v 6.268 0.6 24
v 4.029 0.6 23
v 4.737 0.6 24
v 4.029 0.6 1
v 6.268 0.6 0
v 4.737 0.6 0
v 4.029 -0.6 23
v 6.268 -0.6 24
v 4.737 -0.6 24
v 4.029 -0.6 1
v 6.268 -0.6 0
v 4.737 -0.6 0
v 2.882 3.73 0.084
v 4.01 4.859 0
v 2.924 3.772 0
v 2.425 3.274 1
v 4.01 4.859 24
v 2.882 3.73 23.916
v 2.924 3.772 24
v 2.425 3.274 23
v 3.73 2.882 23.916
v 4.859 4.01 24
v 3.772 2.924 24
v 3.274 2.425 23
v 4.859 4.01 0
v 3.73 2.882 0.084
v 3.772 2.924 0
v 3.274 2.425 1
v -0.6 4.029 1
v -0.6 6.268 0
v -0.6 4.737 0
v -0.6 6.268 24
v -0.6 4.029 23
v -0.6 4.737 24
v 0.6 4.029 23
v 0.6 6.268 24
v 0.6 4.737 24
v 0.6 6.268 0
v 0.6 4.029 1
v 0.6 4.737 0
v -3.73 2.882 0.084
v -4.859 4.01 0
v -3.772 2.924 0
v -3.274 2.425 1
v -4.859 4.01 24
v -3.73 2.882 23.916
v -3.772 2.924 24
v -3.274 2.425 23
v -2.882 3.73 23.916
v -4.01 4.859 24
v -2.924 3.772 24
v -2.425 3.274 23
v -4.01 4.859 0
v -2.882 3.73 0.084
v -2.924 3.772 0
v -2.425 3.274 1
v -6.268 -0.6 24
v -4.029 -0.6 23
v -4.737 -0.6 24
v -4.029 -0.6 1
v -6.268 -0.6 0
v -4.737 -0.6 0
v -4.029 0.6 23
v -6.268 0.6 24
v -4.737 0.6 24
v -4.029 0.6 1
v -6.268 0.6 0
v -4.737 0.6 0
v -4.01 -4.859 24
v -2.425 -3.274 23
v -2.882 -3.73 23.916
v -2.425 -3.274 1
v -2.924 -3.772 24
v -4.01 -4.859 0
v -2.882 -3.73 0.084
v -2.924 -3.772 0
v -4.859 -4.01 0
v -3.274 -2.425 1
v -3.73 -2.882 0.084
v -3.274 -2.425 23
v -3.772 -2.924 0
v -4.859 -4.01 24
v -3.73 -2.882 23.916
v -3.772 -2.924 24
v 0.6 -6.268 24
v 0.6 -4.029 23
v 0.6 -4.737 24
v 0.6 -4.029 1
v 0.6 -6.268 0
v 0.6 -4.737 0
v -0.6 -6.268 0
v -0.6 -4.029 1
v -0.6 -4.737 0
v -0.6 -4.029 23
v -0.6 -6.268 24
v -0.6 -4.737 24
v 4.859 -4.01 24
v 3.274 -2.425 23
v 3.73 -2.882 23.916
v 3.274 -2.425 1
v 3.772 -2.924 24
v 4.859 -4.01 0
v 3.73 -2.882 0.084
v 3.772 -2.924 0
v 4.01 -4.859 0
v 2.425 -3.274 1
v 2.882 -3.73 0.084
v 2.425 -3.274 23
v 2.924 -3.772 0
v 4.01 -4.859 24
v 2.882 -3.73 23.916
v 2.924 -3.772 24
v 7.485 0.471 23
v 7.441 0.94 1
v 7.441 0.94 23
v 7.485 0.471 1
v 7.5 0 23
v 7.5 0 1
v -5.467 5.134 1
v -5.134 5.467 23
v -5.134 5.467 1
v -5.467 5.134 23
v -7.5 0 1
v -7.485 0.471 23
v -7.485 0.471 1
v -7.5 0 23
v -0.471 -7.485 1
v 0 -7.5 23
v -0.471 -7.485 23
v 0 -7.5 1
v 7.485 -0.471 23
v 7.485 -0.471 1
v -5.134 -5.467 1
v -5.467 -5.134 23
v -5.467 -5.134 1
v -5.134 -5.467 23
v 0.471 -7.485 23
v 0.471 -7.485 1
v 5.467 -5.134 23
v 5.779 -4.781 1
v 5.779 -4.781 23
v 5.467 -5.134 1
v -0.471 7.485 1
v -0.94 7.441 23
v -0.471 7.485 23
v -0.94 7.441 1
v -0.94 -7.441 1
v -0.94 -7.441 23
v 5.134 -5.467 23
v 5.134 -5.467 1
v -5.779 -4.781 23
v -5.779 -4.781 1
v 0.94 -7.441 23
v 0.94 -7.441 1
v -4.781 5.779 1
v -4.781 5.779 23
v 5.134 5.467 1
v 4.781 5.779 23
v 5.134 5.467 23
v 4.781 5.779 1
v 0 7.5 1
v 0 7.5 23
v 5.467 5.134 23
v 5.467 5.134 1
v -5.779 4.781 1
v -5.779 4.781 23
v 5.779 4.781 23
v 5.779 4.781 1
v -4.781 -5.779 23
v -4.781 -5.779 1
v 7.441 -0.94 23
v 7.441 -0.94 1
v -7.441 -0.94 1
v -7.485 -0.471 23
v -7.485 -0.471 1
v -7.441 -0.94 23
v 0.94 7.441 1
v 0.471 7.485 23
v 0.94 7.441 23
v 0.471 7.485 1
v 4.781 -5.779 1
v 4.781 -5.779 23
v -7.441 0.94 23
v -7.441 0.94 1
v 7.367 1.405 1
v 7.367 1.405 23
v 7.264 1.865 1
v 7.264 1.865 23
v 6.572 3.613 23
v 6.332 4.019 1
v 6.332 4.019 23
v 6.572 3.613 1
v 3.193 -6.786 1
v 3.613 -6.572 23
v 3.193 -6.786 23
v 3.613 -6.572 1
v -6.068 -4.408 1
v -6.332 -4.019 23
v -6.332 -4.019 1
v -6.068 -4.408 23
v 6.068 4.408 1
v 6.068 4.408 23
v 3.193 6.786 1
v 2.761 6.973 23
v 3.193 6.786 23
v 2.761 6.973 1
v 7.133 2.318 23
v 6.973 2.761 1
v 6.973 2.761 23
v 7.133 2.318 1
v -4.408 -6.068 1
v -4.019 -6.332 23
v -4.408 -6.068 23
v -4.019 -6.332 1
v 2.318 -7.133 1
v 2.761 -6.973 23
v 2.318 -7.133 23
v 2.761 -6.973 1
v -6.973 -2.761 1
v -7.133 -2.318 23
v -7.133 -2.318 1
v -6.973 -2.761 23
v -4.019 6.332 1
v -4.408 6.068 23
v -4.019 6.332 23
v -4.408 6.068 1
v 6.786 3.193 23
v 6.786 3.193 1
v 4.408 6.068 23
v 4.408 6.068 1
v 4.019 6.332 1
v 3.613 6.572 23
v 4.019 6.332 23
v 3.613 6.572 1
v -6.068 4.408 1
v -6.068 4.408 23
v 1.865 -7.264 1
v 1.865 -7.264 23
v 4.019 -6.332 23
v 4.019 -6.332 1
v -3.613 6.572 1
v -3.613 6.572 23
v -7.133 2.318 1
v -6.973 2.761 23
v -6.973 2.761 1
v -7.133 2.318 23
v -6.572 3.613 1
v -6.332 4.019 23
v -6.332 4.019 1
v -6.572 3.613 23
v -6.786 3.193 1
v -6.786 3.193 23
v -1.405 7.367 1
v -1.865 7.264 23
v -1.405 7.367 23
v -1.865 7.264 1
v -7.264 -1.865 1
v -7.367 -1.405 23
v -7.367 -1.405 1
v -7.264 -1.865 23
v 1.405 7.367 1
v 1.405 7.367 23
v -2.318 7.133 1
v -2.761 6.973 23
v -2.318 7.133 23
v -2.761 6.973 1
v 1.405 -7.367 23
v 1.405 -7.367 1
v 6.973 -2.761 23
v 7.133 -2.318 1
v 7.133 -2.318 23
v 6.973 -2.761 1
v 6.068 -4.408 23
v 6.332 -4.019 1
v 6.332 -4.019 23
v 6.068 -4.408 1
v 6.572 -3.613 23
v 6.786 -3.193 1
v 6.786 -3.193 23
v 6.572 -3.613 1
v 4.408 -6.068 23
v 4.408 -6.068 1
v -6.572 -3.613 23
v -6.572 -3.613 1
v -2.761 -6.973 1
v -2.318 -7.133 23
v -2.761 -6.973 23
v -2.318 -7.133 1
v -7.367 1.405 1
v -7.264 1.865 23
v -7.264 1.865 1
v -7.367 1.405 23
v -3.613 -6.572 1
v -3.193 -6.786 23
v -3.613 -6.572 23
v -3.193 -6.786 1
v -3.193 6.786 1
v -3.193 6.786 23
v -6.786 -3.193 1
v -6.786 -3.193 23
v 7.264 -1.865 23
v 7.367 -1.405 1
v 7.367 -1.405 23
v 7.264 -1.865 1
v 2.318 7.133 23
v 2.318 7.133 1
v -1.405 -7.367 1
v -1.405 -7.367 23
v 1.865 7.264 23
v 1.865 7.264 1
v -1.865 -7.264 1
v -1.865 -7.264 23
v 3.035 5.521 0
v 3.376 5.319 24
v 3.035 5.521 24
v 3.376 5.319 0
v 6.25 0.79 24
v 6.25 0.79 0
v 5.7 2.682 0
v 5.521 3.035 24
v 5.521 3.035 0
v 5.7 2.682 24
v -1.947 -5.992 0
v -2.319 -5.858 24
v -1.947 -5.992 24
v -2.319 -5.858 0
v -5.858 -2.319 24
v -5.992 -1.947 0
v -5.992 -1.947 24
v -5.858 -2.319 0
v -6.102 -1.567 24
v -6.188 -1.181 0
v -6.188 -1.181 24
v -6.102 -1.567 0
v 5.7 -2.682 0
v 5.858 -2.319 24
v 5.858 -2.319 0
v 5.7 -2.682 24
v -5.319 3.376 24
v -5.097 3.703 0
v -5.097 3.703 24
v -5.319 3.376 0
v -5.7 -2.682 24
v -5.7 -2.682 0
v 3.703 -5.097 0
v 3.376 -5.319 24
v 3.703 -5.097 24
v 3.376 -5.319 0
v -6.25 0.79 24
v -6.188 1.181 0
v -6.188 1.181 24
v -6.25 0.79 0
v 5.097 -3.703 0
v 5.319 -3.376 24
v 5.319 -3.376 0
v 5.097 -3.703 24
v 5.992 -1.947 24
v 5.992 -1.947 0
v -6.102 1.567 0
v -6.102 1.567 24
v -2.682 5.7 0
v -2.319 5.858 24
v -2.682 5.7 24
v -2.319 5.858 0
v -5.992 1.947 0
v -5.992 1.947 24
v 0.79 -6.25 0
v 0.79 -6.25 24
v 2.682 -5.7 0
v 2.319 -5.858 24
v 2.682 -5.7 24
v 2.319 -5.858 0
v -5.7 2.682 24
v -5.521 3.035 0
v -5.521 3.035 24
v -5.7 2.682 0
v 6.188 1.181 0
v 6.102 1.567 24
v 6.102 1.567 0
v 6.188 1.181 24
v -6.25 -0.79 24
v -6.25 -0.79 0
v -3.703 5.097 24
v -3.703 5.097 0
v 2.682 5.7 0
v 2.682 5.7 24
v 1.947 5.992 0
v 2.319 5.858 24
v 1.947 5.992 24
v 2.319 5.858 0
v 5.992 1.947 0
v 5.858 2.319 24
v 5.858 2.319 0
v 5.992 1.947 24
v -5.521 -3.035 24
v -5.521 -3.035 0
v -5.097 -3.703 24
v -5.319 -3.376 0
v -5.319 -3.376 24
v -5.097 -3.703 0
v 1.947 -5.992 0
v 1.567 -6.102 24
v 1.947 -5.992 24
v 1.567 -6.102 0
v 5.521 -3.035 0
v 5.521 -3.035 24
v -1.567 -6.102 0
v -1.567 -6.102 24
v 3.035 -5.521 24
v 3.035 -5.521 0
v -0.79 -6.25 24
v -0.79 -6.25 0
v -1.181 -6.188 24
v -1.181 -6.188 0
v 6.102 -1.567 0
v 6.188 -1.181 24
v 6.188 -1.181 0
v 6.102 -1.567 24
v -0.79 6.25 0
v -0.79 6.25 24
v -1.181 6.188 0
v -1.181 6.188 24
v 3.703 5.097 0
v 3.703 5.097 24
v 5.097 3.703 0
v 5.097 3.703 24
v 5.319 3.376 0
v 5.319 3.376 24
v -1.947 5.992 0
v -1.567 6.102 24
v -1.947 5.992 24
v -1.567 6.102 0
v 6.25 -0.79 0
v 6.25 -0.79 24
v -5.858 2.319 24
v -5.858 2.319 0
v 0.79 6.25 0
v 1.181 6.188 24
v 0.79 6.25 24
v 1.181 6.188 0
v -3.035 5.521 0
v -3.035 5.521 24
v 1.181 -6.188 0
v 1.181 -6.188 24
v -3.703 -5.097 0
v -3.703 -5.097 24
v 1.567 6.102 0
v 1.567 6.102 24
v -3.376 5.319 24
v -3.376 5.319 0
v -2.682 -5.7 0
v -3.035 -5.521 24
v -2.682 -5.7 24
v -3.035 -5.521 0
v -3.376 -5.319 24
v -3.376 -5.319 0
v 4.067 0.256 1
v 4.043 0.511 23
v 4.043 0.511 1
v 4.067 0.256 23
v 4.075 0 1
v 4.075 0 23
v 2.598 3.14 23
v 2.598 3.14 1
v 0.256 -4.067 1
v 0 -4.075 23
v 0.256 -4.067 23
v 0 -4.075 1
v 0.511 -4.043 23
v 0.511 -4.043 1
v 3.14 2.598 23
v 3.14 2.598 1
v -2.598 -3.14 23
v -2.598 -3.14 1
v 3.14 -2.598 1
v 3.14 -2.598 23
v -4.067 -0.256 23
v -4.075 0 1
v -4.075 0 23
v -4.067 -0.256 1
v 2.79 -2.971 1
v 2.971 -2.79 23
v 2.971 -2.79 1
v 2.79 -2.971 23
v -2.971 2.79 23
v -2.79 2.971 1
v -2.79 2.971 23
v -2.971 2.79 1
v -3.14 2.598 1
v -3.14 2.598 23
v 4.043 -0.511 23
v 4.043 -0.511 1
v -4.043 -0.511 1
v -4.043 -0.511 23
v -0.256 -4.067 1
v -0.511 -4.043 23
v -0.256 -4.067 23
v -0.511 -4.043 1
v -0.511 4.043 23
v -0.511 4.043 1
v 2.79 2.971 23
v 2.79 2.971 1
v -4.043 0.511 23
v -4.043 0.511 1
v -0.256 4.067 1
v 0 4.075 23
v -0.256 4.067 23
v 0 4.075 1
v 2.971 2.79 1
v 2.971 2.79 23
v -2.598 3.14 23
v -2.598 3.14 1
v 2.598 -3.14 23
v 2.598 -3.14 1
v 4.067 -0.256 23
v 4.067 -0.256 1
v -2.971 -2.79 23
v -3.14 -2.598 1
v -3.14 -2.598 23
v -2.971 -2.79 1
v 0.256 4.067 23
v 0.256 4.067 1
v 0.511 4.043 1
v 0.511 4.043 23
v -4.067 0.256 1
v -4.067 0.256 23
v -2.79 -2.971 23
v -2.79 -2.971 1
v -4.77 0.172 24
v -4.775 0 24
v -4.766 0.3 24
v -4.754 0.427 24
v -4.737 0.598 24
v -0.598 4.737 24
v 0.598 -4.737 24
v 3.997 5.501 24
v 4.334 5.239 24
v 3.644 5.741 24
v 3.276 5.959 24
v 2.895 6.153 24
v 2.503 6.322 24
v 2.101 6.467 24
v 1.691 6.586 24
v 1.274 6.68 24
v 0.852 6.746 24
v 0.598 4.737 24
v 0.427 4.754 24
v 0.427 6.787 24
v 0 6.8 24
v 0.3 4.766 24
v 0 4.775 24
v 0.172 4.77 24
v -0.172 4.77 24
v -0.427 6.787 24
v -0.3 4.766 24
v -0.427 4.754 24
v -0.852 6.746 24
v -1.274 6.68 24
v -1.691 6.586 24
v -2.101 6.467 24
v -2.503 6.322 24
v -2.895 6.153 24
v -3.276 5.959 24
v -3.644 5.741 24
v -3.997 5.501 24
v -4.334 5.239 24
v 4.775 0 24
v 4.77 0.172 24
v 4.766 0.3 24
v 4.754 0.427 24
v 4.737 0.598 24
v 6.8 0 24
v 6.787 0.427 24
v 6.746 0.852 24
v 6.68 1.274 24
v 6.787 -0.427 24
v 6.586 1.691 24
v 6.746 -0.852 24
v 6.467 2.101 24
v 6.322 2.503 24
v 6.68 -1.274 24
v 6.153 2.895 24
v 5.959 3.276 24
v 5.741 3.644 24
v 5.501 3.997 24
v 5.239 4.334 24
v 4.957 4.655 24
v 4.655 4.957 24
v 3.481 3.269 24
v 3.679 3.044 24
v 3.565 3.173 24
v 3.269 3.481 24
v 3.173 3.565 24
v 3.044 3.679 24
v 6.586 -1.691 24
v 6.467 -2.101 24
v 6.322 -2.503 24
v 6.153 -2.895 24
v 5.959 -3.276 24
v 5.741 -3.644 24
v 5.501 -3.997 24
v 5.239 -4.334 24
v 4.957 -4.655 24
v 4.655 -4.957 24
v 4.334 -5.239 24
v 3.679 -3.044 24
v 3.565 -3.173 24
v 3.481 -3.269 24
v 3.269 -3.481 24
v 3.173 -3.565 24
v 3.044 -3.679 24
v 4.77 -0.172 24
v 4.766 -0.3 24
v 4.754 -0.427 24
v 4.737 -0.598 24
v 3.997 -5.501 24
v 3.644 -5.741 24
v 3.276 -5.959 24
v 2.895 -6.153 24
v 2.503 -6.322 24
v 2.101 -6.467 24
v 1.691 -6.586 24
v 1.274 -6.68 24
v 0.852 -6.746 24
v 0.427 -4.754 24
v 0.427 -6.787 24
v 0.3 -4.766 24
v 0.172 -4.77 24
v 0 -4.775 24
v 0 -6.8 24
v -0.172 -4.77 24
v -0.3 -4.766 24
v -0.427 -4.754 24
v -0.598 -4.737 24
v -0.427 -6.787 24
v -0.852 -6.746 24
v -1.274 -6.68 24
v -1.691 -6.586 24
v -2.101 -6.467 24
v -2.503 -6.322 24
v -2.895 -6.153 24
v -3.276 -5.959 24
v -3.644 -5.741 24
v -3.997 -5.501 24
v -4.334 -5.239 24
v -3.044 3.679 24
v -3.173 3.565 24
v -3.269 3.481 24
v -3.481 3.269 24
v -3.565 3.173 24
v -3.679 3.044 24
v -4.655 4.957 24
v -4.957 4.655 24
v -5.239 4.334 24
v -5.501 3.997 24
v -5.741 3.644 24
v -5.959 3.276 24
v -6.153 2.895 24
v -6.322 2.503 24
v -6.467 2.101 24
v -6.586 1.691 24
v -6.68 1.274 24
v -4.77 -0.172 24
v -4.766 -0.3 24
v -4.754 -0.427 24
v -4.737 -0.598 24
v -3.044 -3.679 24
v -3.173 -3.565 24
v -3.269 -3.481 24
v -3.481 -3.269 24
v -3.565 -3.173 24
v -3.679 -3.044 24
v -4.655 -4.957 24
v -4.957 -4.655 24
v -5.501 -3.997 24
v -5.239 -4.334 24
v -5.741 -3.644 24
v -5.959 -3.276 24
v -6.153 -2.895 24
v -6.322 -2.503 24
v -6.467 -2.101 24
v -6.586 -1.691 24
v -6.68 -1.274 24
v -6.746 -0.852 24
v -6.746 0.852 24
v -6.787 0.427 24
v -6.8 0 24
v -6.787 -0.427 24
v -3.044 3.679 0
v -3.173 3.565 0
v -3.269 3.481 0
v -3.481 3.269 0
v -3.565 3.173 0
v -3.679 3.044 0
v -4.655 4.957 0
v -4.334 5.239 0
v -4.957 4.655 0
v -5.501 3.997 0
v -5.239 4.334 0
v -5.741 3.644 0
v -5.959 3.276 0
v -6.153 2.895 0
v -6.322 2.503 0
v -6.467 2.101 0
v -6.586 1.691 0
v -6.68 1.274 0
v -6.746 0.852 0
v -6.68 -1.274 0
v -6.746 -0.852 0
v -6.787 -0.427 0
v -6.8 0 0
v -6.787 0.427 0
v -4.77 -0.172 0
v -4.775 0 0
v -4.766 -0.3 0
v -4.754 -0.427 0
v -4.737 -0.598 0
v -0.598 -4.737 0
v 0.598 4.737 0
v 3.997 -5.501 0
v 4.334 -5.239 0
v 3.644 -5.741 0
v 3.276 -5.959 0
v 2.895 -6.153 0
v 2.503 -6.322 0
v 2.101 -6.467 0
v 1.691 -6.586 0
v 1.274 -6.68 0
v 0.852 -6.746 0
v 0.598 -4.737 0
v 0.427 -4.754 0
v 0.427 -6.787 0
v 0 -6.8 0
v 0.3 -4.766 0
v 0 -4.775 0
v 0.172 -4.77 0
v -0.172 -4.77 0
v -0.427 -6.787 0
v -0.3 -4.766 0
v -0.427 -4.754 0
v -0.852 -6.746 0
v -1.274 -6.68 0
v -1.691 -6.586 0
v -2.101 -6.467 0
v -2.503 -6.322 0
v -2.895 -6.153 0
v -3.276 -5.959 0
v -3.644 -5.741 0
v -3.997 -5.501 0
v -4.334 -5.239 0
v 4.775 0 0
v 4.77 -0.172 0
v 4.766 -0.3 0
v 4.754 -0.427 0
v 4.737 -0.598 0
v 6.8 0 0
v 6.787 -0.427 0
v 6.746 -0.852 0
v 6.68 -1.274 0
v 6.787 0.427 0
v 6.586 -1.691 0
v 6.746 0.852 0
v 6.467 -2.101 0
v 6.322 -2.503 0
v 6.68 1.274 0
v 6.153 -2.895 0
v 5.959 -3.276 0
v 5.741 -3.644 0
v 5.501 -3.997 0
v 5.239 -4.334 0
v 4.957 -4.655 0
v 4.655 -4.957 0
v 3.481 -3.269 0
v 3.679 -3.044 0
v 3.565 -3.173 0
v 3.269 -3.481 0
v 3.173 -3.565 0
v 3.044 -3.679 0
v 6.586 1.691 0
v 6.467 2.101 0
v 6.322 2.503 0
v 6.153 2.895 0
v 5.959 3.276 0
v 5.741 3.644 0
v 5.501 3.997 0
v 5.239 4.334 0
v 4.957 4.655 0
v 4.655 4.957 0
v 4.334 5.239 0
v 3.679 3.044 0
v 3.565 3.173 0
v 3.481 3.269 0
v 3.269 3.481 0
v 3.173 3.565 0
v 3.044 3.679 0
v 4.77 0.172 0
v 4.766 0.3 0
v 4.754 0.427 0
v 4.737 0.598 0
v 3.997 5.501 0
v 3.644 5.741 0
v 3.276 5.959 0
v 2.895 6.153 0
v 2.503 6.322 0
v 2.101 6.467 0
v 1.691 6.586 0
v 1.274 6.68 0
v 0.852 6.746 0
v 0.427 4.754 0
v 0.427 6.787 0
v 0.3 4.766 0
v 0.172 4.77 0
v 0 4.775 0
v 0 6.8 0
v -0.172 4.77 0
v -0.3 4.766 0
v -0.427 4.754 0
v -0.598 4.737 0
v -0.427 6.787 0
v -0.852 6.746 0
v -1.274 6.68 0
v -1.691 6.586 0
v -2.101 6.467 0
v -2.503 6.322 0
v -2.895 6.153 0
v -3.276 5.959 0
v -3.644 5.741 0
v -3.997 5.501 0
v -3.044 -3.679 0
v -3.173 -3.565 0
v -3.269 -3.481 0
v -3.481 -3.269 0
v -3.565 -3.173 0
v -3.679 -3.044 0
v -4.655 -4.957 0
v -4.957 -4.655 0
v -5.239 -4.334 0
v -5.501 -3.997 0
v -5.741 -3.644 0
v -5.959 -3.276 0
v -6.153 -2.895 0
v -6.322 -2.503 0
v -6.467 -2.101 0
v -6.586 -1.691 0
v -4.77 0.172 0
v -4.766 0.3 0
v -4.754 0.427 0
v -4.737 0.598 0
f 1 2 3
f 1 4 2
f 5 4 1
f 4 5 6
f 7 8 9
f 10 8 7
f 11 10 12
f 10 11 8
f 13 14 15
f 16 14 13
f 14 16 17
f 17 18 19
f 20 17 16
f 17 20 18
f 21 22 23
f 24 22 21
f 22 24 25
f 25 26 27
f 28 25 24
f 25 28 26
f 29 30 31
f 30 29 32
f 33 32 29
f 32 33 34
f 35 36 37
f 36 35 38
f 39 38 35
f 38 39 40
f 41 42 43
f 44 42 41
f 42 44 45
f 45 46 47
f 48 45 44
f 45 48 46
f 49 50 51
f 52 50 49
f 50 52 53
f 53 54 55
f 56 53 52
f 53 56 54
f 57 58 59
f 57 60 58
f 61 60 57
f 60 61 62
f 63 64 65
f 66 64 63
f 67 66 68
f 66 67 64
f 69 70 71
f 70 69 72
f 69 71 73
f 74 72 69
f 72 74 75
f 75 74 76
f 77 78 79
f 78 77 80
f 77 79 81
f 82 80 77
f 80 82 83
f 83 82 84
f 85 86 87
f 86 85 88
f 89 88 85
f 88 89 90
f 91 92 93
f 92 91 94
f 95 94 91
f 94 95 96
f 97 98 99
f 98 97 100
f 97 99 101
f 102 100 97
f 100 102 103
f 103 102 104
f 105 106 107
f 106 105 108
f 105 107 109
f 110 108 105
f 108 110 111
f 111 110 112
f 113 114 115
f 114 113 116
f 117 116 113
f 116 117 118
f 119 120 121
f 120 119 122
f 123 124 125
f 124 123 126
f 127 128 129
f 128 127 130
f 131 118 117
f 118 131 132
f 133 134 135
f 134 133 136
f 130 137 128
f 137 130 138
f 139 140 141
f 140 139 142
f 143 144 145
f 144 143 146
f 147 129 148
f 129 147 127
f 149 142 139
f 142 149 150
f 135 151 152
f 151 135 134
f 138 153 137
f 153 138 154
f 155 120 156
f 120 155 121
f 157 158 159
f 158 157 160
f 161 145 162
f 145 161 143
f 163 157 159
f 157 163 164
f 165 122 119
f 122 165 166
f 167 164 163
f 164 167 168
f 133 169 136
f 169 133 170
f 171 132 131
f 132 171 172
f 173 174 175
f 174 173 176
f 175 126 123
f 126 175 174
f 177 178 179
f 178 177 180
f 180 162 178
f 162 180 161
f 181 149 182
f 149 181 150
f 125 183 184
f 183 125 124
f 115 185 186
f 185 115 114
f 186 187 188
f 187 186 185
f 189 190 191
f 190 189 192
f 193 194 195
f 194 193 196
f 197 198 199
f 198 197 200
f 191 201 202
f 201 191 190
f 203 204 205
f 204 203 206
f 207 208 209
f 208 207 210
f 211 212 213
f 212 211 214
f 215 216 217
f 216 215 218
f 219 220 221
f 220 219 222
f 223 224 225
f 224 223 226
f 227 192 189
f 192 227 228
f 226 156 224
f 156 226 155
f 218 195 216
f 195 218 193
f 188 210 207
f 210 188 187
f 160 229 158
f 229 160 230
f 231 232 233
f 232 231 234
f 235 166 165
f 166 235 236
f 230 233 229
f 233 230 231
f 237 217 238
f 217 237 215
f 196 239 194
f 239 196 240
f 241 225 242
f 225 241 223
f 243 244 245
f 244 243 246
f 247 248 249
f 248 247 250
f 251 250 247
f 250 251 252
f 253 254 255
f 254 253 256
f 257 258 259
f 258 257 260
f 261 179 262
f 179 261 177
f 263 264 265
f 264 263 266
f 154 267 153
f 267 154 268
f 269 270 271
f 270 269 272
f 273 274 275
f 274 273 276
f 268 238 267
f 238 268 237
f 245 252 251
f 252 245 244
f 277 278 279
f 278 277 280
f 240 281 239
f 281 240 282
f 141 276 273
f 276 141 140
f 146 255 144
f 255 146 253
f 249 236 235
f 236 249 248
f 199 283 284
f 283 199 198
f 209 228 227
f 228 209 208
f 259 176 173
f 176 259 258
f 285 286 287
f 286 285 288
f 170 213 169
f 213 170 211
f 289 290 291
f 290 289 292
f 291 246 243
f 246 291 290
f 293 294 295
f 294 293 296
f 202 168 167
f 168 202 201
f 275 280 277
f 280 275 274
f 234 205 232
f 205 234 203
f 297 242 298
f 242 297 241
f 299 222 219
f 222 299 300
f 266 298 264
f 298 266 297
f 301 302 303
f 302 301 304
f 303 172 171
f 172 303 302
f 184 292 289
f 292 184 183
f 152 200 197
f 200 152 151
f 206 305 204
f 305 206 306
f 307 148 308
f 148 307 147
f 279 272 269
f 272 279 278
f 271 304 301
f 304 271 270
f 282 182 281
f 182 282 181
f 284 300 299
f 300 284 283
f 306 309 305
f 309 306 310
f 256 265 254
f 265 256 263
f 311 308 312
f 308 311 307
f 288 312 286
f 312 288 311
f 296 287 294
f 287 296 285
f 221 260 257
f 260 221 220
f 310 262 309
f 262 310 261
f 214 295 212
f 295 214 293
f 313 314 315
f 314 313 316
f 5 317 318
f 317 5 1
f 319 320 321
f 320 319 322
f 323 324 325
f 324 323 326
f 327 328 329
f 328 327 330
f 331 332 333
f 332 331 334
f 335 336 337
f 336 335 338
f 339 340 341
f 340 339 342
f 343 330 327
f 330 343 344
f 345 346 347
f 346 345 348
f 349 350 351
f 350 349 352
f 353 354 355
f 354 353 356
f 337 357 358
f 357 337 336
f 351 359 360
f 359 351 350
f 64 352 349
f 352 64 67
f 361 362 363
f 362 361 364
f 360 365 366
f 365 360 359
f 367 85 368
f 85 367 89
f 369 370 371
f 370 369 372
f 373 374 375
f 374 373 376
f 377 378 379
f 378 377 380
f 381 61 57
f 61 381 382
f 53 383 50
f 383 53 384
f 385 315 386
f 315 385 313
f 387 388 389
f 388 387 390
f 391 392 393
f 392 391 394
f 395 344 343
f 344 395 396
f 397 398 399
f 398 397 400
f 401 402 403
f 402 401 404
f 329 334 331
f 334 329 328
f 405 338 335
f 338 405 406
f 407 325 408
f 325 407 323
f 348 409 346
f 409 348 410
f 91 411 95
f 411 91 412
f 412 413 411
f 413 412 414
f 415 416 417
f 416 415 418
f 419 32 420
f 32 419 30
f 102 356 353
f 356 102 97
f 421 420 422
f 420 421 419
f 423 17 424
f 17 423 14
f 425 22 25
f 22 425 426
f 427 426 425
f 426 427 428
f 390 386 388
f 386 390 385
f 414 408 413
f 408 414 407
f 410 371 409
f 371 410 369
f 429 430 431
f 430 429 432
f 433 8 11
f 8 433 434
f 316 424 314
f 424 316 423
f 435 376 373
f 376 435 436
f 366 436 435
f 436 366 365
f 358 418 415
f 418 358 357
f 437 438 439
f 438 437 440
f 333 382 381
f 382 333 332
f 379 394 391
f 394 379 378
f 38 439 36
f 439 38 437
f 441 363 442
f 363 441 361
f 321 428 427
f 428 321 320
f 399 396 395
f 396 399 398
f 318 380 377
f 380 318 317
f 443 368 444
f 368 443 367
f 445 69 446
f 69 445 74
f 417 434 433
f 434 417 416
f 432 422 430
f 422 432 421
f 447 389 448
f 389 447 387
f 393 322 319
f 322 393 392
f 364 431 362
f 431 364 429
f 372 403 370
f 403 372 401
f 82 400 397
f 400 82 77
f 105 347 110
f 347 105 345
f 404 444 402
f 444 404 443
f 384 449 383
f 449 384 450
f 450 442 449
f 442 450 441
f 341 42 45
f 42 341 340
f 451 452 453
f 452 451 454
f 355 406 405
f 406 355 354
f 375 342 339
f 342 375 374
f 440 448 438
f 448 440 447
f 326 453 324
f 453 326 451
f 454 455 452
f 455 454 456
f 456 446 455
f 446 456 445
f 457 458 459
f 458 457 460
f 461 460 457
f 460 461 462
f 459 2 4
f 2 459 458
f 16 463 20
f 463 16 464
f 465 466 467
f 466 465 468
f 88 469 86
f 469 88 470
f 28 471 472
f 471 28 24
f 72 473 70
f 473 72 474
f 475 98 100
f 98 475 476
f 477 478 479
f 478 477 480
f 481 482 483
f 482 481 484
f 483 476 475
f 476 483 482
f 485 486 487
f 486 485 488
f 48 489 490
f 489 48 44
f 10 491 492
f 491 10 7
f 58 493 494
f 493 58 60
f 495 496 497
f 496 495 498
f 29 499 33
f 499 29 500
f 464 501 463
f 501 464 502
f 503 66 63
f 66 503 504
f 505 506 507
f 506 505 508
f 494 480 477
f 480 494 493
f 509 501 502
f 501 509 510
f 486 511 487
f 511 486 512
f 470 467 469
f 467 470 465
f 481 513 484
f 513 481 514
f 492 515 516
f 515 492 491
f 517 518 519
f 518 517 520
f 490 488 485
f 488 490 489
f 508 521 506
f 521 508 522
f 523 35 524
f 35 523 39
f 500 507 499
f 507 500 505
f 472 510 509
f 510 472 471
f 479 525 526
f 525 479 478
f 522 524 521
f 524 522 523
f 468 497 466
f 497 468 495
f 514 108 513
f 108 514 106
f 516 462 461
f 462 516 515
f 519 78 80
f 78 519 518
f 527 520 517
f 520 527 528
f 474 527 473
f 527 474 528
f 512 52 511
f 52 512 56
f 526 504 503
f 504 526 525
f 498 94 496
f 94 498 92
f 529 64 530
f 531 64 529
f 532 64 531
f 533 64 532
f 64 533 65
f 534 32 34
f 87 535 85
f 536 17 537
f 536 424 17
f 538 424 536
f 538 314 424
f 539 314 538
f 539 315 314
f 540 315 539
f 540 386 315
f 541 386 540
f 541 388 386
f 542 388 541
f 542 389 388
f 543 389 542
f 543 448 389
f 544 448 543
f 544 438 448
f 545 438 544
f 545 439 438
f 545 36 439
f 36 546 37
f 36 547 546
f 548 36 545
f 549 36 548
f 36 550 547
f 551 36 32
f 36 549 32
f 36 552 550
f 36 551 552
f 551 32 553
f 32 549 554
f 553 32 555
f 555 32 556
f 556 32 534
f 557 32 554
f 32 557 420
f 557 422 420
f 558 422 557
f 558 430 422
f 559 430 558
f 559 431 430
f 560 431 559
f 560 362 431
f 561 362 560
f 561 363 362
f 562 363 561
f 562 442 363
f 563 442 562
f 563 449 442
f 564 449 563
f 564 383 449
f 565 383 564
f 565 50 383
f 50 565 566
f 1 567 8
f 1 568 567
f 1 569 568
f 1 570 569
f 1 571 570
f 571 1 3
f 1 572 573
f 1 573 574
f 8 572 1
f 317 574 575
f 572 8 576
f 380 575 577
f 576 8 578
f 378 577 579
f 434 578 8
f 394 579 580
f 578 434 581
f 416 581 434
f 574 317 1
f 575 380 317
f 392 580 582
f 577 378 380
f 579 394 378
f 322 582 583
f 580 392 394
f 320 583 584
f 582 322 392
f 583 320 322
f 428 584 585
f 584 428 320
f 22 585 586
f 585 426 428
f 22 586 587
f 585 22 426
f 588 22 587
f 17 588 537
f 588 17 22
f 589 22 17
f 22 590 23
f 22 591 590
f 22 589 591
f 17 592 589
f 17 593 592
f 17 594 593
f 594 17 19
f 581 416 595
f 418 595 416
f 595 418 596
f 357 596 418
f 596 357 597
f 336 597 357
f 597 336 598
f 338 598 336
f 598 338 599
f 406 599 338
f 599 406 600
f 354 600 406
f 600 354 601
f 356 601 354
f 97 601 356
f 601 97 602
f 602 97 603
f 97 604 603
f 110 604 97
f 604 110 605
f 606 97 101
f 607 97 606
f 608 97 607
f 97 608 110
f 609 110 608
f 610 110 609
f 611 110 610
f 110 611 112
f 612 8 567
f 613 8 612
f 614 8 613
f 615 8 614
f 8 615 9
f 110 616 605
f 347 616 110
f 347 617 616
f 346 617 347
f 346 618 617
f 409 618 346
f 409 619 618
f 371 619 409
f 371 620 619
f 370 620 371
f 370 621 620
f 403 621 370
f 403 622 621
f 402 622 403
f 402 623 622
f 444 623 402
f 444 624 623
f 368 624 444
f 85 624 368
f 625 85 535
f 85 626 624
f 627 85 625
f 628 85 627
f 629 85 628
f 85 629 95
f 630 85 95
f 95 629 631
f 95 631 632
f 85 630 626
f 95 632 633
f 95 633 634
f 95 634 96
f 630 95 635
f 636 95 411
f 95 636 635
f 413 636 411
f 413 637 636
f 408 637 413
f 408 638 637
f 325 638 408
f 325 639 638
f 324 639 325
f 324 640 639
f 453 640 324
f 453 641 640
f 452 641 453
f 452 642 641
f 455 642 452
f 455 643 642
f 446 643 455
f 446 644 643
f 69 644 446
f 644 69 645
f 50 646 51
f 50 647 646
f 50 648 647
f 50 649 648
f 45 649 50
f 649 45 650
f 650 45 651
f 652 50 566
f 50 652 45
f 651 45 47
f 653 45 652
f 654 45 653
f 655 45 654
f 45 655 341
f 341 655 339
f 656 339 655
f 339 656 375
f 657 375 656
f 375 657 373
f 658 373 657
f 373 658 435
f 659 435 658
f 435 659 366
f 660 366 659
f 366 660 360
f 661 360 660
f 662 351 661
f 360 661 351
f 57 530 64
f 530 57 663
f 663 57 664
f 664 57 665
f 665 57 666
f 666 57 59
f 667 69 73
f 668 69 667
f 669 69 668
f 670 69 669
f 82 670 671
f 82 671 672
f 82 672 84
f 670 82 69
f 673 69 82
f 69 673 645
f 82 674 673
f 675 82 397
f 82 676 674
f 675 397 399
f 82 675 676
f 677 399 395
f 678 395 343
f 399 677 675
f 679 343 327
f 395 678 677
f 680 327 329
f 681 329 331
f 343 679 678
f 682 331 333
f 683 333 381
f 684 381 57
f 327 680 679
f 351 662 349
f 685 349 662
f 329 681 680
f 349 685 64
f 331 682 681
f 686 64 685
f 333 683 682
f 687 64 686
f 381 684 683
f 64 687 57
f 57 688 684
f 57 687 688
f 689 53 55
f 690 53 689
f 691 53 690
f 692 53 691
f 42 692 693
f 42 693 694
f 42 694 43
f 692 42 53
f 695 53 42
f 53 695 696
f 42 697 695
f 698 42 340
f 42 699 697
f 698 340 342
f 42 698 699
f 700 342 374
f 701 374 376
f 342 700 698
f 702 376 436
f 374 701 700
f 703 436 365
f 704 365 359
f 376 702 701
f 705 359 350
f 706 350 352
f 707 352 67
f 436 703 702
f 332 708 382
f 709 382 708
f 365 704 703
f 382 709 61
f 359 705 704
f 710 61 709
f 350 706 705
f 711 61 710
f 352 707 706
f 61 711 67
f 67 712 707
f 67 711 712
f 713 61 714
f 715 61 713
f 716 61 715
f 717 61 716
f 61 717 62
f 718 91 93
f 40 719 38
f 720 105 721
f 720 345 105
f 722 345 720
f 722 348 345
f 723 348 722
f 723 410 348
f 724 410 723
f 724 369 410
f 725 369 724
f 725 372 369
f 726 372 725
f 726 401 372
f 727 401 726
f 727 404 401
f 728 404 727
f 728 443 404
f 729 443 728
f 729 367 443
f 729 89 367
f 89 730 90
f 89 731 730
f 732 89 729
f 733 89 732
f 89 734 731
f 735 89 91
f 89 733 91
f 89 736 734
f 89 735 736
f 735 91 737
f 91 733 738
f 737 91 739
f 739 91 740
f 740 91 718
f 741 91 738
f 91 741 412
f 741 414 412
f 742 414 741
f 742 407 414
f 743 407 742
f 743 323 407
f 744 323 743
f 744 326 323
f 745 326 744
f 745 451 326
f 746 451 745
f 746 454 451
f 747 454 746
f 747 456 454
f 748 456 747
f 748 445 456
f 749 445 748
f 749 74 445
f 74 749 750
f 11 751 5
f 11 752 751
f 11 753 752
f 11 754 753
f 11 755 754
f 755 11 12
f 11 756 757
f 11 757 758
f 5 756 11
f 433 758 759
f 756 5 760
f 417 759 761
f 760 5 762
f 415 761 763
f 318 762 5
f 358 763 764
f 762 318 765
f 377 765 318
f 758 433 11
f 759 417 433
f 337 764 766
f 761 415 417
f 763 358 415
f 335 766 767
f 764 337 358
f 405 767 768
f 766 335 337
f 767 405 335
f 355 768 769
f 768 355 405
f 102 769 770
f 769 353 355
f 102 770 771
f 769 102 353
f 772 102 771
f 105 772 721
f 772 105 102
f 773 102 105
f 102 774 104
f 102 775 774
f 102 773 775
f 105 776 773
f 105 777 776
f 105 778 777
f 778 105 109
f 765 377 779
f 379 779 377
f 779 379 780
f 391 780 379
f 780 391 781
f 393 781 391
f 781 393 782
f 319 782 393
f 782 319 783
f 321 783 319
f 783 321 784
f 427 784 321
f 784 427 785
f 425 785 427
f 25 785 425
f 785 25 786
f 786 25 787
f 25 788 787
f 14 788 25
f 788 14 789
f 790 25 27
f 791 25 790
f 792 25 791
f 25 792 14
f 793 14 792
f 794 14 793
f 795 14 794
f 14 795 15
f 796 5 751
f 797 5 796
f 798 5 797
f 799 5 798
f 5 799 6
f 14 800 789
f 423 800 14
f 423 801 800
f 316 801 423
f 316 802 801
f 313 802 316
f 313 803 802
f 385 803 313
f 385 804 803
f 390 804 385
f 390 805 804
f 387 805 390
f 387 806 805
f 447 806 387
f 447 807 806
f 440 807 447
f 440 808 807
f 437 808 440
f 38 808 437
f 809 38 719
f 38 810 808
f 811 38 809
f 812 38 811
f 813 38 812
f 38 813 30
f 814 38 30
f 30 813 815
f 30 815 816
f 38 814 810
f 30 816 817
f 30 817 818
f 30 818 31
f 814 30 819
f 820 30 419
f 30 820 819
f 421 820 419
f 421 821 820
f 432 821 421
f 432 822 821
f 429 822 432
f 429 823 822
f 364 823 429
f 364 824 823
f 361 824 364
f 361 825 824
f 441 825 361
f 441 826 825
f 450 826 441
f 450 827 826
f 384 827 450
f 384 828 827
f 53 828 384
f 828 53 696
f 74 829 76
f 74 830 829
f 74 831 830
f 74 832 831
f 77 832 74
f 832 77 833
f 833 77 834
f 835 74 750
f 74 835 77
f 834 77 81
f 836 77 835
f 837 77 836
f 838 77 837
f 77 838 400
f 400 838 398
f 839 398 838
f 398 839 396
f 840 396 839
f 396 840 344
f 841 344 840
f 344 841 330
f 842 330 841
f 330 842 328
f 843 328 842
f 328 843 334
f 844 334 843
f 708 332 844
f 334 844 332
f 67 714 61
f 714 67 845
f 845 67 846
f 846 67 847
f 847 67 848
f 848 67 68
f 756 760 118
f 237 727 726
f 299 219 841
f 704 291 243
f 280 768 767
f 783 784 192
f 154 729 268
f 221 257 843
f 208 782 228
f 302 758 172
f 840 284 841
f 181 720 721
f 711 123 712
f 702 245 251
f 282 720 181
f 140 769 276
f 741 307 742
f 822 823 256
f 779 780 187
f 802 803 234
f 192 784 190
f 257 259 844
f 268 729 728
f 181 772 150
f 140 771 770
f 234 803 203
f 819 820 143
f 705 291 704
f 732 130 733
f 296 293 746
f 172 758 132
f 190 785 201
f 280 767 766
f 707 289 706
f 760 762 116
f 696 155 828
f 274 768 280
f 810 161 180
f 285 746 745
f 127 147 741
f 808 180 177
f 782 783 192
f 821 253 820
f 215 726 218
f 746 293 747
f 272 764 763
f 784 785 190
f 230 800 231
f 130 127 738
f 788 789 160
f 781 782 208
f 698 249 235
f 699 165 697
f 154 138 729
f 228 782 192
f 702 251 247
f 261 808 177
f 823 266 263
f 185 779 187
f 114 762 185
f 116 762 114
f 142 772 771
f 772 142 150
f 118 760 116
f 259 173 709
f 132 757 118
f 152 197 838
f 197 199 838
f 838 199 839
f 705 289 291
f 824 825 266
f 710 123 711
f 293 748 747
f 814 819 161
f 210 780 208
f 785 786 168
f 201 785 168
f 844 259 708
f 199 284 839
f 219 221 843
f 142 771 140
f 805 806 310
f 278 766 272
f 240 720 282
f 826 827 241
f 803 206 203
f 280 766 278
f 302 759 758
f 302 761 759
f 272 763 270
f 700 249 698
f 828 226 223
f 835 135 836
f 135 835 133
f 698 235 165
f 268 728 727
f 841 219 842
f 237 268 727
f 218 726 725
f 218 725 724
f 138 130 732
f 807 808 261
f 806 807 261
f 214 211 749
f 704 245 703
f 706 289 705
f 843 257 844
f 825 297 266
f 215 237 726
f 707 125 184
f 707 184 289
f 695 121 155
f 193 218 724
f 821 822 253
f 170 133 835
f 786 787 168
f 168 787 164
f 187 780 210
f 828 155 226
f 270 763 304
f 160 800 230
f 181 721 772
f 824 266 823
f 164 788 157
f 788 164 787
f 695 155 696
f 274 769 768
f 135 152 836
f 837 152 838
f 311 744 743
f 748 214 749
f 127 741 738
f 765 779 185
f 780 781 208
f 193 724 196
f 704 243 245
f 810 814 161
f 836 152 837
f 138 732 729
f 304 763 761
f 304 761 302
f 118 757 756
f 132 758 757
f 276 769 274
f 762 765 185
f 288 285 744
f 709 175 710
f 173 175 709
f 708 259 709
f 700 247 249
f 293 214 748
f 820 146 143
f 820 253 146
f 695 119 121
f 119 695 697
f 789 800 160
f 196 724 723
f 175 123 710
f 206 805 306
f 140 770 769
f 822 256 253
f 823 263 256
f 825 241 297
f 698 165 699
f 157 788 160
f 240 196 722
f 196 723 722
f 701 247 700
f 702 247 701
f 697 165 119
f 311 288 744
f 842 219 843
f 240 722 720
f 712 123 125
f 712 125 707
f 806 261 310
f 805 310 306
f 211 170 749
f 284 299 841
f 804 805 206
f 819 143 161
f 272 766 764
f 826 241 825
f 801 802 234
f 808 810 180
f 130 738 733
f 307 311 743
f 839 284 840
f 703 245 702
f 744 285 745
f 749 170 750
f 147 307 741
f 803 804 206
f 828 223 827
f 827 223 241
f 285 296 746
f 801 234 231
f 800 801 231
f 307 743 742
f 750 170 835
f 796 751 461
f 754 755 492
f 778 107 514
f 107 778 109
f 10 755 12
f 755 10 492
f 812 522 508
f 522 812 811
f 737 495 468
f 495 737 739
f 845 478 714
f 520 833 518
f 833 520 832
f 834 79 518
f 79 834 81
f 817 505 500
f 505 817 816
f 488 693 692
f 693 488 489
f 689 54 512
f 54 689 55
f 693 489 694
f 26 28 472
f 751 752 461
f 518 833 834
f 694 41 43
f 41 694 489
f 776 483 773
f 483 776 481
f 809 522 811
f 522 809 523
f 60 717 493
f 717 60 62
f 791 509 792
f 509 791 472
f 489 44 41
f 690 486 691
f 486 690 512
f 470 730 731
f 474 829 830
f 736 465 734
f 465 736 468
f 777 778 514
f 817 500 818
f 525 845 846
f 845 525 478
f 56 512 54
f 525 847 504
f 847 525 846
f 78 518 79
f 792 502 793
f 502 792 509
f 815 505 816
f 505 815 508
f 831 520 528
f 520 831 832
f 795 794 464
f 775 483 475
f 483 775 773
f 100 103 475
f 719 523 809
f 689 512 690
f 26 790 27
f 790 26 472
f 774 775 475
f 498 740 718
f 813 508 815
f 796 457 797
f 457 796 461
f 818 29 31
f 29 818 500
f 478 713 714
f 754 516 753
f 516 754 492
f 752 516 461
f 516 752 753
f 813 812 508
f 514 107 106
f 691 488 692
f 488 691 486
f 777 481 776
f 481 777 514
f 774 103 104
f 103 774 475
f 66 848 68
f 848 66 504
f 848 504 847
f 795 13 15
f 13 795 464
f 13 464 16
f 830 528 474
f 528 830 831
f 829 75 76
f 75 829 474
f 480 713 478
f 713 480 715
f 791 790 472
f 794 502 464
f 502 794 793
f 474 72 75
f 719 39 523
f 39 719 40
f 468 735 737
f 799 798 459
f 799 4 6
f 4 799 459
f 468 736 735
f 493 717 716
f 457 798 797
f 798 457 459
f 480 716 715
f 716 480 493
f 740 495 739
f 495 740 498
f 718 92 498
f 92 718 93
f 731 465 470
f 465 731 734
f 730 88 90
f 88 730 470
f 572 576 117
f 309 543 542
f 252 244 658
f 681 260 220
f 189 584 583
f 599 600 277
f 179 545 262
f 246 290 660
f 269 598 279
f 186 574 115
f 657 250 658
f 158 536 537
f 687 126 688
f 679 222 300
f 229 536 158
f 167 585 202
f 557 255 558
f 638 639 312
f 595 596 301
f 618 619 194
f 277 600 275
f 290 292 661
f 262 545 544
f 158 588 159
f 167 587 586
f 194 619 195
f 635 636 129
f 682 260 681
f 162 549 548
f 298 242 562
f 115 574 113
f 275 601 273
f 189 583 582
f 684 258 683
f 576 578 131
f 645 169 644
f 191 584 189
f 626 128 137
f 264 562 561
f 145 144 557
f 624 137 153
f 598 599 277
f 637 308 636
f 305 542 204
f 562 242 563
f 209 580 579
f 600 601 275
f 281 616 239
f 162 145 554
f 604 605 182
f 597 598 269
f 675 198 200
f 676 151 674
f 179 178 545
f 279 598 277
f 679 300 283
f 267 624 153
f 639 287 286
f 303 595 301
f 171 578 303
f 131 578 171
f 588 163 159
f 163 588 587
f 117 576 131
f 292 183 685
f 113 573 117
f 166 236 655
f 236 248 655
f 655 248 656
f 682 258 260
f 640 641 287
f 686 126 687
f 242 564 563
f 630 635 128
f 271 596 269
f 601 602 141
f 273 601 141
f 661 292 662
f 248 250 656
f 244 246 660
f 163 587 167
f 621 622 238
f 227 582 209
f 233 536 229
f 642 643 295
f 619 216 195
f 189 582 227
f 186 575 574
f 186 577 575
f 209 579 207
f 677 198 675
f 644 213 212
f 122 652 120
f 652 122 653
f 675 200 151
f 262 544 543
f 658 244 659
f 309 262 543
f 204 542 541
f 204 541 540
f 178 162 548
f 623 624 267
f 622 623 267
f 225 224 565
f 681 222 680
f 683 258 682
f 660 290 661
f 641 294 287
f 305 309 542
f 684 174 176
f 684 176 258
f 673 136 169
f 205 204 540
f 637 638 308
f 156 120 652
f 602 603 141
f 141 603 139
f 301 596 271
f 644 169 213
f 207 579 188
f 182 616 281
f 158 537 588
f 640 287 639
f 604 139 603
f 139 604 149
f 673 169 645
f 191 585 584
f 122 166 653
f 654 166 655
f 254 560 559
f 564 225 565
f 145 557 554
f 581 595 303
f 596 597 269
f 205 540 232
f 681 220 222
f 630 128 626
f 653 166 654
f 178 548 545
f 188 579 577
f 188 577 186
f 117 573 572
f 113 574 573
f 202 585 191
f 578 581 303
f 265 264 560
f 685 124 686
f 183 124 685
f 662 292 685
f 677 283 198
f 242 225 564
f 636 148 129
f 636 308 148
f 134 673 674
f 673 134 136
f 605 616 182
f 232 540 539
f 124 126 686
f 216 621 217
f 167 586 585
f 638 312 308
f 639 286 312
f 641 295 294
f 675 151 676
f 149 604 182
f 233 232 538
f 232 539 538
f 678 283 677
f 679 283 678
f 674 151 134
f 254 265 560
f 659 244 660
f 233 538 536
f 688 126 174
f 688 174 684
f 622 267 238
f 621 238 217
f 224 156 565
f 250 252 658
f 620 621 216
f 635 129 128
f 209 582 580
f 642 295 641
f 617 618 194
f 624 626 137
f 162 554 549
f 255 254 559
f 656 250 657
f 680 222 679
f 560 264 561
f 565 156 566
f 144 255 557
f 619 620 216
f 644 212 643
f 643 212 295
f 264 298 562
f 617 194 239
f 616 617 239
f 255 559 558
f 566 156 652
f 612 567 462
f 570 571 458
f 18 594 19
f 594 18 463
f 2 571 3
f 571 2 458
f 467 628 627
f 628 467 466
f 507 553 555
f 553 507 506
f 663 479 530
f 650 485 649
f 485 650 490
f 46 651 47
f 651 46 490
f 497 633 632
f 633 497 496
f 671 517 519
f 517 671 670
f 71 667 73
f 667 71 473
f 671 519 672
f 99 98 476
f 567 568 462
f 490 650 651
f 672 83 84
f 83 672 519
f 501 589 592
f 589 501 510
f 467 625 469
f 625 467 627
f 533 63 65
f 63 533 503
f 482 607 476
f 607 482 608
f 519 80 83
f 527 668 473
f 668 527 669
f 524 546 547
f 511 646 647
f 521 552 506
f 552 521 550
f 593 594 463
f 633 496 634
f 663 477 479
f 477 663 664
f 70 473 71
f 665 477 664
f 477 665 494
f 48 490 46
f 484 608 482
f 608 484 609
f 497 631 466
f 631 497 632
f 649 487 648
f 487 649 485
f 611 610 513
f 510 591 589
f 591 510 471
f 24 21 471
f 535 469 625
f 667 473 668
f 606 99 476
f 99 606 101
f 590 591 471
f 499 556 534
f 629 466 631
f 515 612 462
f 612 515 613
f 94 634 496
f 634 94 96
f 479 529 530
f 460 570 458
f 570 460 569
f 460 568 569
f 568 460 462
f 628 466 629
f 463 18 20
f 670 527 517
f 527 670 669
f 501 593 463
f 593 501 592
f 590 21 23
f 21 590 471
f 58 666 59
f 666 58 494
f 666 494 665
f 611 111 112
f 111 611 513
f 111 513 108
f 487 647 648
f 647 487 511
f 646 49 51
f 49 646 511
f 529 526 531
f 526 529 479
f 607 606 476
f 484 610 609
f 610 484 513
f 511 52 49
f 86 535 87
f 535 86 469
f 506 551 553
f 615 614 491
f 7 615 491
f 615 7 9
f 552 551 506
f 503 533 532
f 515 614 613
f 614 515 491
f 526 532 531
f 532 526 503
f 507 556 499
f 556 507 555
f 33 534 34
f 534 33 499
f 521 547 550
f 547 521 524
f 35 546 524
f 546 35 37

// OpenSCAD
 /*
 * Customizable Linear Bushing - https://www.thingiverse.com/thing:2202854
 * by Dennis Hofmann - https://www.thingiverse.com/mightynozzle/about
 * created 2017-03-25
 * updated 2018-02-15
 * version v1.8
 *
 * Changelog
 * --------------
 * v1.8:
 *      - groove option added
 * v1.7:
 *      - fixed inner diameter
 * v1.6:
 *      - added chamfer angle option
 * v1.5:
 *      - fixed graphic glitch
 * v1.4:
 *      - added chamfer option
 *
 * v1.1-1.3:
 *      - initial model with minor changes in description
 *
 * --------------
 * 
 * This work is licensed under the Creative Commons - Attribution - Non-Commercial license.
 * https://creativecommons.org/licenses/by-nc/3.0/
 */
 
 // Parameter Section //
//-------------------//

/* [Bushing Settings] */

// Equals dr in technical diagrams. Use the outer diameter of the rod + tolerance value of your printer. Do some test prints before print a whole set of bushings. Best way in my case is to choose the bushing where can push it in with some effort on the rod and slide it by hand without any tools. Then slide it back and forth along the rod, until the bushing has the expected behavior. I suggest you not to use any drill or heat. The sliding of the bushing generates enough heat from its friction against the rod. Standard values: 6.00 for LM6(L)UU, 8.00 (default 8.15) for LM8(L)UU, 10.00 for LM10(L)UU, 12.00 for LM12(L)UU, 16.00 for LM16UU, ...
inner_diameter_in_millimeter = 8.15;

// Equals D in technical diagrams. Use the inner diameter of housing where the bushing sits + tolerance value of your printer. Depends on the filament you use and the total wall thickness of the bushings, the bushing shouldn't fit to tight in the housing. Standard values: 12.0 for LM6(L)UU, 15.0 (default) for LM8(L)UU, 19.0 for LM10(L)UU, 21.0 for LM12(L)UU, 28.0 for LM16UU, ...
outer_diameter_in_millimeter = 15; 

// Equals L in technical diagrams. Standard values: 19.0 for LM6UU, 24.0 for LM8UU, 29.0 for LM10UU, 30.0 for LM12UU, 35.0 for LM6LUU, 37.0 for LM16UU, 45.0 for LM8LUU, 55.0 for LM10LUU, 57.0 for LM12LUU, ...
bushing_length_in_millimeter = 24.0;

// Use a value to get straight primeters without any zigzag between the outer and inner perimeter. I use the value of 0.48 for 0.4 nozzle. This is the auto extrusion width of 0.48 of simplify3d. More information about this in the description of this design on thingiverse.
extrusion_width_in_millimeter = 0.3; 

// Use even numbers. E.g. 4 for LM8(L)UU. Don't forget to set the perimeter number in your Slicer! 
number_of_perimeters = 4; //[2:2:10]

// Choose a number to provide a gap between the teeth in the bushing. E.g. 8 or 10 for LM8(L)UU. The tooth width depends on the extrusion_width_in_millimeter and the number_of_perimeters.
number_of_teeth = 8; //[3:20]

// Radius of the chamfer. Set a chamfer if you want to insert the rod easier. This also helps if your prints tends to create elephant foot in the first few layers. A value between 0.3 and 1.0 might be a good value. Set a value above 0 might destroy the preview of the bushing. But the resulting stl-File will be correct.
chamfer_radius_in_millimeter = 0.7;

// Set the angle of the chamfer. 
chamfer_angle_in_degree = 55.0; // [30:75]

// Equals W in technical diagram. 1.1 for LM6/8(L)UU, 1.3 for LM10/12/13(L)UU, 1.6 for LM16/20(L)UU, 1.85 for LM25/30(L)UU, 2.1 for LM35/40(L)UU, 2.6 for LM50(L)UU, 3.15 for LM60(L)UU
groove_length_in_millimeter = 0;

// Equals D1 in technical diagram. 11.5 for LM6(L)UU, 14.3 for LM8(L)UU, 18.0 for LM10(L)UU, 20.0 for LM12(L)UU, 22.0 for LM13(L)UU, 27.0 for LM16(L)UU, 30.5 for LM20(L)UU, 38.0 for LM25(L)UU, 43.0 for LM30(L)UU, 49.0 for LM35(L)UU, 57.0 for LM40(L)UU, 76.5 for LM50(L)UU, 86.5 for LM60(L)UU
groove_diameter_in_millimeter = 0;

// Equals B in technical diagram. Outer distance between both grooves. 13.5 for LM6UU, 17.5 for LM8UU, 22.0 for LM10UU, 23.0 for LM12UU, 26.5 for LM16UU, 27.0 for LM6LUU, 35.0 for LM8UU, 44.0 for LM10LUU, 46.0 for LM12LUU, 53.0 for LM16LUU
groove_distance_in_millimeter = 0;

/* [Hidden] */
inner_dia = inner_diameter_in_millimeter;
outer_dia = outer_diameter_in_millimeter;
bushing_l = bushing_length_in_millimeter;
extrusion_w = extrusion_width_in_millimeter;
perimeters = number_of_perimeters;
teeth = number_of_teeth;
chamfer_r = chamfer_radius_in_millimeter;
chamfer_h = tan(chamfer_angle_in_degree) * chamfer_r;
groove_l = groove_length_in_millimeter;
groove_dia = groove_diameter_in_millimeter;
groove_d = groove_distance_in_millimeter;


$fn=100;

 // Program Section //
//-----------------//

color("HotPink") difference() {
    bushing();
    if(chamfer_r > 0) {
        chamfer_cut();
        translate([0, 0, bushing_l]) {
            rotate([180,0,0]) {
                chamfer_cut();
            }
        }
    }
    groove_cut();
}


 // Module Section //
//----------------//

module bushing() {
    translate([0, 0, bushing_l / 2]) {
        difference() {
            union() {
                difference() {
                    for(tooth = [0 : teeth - 1])
                        rotate([0, 0, 360 / teeth * tooth]) {
                            translate([outer_dia / 4, 0, 0]) {
                                cube([outer_dia / 2, extrusion_w * perimeters, bushing_l + 1], center = true);
                            }
                        }
                        translate([0, 0, -bushing_l / 2-1]) {
                            ring(outer_dia * 2, outer_dia, bushing_l + 2);
                        }
                    }
                    translate([0, 0, -bushing_l / 2 - 1]) {
                        ring(outer_dia, outer_dia - extrusion_w * perimeters * 2, bushing_l + 2);
                    }
            }
            cylinder(d = inner_dia, h = bushing_l + 2, center = true);
            translate([0, 0, bushing_l / 2]) {
                cylinder(d = outer_dia + 1, h = 2, $f = 16);
            }
            translate([0, 0, -(bushing_l / 2 + 2)]) {
                cylinder(d = outer_dia + 1, h = 2, $f = 16);
            }
        }
    }
}

module ring(d1, d2, height) {
    difference() {
        cylinder(d = d1, h = height, center = false);
        cylinder(d = d2, h = height, center = false);
    }
}

module chamfer_cut() {
    union() {
        difference() {
            translate([0, 0, -1]) {
                cylinder(d = outer_dia + 1, h = chamfer_h + 1);
            }
            intersection() {
                cylinder(d = outer_dia, h = chamfer_h);
                cylinder(d1 = outer_dia - chamfer_r * 2, d2 = outer_dia, h = chamfer_h);
            }
        }
        translate([0, 0, -chamfer_h]) {
            intersection() {
                cylinder(d = inner_dia + chamfer_r * 4, h = chamfer_h * 2);
                cylinder(d1 = inner_dia + chamfer_r * 4, d2 = inner_dia, h = chamfer_h * 2);
            }
        }
        translate([0, 0, -10]) {
            cylinder(d = outer_dia + 1, h = 10);
        }
    }
}

module groove_cut() {
    translate([0, 0, bushing_l / 2 - groove_d / 2]) {
        ring(outer_dia + 1, groove_dia, groove_l);
    }
    translate([0, 0, bushing_l - ((bushing_l / 2) - (groove_d / 2) + groove_l)]) {
        ring(outer_dia + 1, groove_dia, groove_l);
    }
}
